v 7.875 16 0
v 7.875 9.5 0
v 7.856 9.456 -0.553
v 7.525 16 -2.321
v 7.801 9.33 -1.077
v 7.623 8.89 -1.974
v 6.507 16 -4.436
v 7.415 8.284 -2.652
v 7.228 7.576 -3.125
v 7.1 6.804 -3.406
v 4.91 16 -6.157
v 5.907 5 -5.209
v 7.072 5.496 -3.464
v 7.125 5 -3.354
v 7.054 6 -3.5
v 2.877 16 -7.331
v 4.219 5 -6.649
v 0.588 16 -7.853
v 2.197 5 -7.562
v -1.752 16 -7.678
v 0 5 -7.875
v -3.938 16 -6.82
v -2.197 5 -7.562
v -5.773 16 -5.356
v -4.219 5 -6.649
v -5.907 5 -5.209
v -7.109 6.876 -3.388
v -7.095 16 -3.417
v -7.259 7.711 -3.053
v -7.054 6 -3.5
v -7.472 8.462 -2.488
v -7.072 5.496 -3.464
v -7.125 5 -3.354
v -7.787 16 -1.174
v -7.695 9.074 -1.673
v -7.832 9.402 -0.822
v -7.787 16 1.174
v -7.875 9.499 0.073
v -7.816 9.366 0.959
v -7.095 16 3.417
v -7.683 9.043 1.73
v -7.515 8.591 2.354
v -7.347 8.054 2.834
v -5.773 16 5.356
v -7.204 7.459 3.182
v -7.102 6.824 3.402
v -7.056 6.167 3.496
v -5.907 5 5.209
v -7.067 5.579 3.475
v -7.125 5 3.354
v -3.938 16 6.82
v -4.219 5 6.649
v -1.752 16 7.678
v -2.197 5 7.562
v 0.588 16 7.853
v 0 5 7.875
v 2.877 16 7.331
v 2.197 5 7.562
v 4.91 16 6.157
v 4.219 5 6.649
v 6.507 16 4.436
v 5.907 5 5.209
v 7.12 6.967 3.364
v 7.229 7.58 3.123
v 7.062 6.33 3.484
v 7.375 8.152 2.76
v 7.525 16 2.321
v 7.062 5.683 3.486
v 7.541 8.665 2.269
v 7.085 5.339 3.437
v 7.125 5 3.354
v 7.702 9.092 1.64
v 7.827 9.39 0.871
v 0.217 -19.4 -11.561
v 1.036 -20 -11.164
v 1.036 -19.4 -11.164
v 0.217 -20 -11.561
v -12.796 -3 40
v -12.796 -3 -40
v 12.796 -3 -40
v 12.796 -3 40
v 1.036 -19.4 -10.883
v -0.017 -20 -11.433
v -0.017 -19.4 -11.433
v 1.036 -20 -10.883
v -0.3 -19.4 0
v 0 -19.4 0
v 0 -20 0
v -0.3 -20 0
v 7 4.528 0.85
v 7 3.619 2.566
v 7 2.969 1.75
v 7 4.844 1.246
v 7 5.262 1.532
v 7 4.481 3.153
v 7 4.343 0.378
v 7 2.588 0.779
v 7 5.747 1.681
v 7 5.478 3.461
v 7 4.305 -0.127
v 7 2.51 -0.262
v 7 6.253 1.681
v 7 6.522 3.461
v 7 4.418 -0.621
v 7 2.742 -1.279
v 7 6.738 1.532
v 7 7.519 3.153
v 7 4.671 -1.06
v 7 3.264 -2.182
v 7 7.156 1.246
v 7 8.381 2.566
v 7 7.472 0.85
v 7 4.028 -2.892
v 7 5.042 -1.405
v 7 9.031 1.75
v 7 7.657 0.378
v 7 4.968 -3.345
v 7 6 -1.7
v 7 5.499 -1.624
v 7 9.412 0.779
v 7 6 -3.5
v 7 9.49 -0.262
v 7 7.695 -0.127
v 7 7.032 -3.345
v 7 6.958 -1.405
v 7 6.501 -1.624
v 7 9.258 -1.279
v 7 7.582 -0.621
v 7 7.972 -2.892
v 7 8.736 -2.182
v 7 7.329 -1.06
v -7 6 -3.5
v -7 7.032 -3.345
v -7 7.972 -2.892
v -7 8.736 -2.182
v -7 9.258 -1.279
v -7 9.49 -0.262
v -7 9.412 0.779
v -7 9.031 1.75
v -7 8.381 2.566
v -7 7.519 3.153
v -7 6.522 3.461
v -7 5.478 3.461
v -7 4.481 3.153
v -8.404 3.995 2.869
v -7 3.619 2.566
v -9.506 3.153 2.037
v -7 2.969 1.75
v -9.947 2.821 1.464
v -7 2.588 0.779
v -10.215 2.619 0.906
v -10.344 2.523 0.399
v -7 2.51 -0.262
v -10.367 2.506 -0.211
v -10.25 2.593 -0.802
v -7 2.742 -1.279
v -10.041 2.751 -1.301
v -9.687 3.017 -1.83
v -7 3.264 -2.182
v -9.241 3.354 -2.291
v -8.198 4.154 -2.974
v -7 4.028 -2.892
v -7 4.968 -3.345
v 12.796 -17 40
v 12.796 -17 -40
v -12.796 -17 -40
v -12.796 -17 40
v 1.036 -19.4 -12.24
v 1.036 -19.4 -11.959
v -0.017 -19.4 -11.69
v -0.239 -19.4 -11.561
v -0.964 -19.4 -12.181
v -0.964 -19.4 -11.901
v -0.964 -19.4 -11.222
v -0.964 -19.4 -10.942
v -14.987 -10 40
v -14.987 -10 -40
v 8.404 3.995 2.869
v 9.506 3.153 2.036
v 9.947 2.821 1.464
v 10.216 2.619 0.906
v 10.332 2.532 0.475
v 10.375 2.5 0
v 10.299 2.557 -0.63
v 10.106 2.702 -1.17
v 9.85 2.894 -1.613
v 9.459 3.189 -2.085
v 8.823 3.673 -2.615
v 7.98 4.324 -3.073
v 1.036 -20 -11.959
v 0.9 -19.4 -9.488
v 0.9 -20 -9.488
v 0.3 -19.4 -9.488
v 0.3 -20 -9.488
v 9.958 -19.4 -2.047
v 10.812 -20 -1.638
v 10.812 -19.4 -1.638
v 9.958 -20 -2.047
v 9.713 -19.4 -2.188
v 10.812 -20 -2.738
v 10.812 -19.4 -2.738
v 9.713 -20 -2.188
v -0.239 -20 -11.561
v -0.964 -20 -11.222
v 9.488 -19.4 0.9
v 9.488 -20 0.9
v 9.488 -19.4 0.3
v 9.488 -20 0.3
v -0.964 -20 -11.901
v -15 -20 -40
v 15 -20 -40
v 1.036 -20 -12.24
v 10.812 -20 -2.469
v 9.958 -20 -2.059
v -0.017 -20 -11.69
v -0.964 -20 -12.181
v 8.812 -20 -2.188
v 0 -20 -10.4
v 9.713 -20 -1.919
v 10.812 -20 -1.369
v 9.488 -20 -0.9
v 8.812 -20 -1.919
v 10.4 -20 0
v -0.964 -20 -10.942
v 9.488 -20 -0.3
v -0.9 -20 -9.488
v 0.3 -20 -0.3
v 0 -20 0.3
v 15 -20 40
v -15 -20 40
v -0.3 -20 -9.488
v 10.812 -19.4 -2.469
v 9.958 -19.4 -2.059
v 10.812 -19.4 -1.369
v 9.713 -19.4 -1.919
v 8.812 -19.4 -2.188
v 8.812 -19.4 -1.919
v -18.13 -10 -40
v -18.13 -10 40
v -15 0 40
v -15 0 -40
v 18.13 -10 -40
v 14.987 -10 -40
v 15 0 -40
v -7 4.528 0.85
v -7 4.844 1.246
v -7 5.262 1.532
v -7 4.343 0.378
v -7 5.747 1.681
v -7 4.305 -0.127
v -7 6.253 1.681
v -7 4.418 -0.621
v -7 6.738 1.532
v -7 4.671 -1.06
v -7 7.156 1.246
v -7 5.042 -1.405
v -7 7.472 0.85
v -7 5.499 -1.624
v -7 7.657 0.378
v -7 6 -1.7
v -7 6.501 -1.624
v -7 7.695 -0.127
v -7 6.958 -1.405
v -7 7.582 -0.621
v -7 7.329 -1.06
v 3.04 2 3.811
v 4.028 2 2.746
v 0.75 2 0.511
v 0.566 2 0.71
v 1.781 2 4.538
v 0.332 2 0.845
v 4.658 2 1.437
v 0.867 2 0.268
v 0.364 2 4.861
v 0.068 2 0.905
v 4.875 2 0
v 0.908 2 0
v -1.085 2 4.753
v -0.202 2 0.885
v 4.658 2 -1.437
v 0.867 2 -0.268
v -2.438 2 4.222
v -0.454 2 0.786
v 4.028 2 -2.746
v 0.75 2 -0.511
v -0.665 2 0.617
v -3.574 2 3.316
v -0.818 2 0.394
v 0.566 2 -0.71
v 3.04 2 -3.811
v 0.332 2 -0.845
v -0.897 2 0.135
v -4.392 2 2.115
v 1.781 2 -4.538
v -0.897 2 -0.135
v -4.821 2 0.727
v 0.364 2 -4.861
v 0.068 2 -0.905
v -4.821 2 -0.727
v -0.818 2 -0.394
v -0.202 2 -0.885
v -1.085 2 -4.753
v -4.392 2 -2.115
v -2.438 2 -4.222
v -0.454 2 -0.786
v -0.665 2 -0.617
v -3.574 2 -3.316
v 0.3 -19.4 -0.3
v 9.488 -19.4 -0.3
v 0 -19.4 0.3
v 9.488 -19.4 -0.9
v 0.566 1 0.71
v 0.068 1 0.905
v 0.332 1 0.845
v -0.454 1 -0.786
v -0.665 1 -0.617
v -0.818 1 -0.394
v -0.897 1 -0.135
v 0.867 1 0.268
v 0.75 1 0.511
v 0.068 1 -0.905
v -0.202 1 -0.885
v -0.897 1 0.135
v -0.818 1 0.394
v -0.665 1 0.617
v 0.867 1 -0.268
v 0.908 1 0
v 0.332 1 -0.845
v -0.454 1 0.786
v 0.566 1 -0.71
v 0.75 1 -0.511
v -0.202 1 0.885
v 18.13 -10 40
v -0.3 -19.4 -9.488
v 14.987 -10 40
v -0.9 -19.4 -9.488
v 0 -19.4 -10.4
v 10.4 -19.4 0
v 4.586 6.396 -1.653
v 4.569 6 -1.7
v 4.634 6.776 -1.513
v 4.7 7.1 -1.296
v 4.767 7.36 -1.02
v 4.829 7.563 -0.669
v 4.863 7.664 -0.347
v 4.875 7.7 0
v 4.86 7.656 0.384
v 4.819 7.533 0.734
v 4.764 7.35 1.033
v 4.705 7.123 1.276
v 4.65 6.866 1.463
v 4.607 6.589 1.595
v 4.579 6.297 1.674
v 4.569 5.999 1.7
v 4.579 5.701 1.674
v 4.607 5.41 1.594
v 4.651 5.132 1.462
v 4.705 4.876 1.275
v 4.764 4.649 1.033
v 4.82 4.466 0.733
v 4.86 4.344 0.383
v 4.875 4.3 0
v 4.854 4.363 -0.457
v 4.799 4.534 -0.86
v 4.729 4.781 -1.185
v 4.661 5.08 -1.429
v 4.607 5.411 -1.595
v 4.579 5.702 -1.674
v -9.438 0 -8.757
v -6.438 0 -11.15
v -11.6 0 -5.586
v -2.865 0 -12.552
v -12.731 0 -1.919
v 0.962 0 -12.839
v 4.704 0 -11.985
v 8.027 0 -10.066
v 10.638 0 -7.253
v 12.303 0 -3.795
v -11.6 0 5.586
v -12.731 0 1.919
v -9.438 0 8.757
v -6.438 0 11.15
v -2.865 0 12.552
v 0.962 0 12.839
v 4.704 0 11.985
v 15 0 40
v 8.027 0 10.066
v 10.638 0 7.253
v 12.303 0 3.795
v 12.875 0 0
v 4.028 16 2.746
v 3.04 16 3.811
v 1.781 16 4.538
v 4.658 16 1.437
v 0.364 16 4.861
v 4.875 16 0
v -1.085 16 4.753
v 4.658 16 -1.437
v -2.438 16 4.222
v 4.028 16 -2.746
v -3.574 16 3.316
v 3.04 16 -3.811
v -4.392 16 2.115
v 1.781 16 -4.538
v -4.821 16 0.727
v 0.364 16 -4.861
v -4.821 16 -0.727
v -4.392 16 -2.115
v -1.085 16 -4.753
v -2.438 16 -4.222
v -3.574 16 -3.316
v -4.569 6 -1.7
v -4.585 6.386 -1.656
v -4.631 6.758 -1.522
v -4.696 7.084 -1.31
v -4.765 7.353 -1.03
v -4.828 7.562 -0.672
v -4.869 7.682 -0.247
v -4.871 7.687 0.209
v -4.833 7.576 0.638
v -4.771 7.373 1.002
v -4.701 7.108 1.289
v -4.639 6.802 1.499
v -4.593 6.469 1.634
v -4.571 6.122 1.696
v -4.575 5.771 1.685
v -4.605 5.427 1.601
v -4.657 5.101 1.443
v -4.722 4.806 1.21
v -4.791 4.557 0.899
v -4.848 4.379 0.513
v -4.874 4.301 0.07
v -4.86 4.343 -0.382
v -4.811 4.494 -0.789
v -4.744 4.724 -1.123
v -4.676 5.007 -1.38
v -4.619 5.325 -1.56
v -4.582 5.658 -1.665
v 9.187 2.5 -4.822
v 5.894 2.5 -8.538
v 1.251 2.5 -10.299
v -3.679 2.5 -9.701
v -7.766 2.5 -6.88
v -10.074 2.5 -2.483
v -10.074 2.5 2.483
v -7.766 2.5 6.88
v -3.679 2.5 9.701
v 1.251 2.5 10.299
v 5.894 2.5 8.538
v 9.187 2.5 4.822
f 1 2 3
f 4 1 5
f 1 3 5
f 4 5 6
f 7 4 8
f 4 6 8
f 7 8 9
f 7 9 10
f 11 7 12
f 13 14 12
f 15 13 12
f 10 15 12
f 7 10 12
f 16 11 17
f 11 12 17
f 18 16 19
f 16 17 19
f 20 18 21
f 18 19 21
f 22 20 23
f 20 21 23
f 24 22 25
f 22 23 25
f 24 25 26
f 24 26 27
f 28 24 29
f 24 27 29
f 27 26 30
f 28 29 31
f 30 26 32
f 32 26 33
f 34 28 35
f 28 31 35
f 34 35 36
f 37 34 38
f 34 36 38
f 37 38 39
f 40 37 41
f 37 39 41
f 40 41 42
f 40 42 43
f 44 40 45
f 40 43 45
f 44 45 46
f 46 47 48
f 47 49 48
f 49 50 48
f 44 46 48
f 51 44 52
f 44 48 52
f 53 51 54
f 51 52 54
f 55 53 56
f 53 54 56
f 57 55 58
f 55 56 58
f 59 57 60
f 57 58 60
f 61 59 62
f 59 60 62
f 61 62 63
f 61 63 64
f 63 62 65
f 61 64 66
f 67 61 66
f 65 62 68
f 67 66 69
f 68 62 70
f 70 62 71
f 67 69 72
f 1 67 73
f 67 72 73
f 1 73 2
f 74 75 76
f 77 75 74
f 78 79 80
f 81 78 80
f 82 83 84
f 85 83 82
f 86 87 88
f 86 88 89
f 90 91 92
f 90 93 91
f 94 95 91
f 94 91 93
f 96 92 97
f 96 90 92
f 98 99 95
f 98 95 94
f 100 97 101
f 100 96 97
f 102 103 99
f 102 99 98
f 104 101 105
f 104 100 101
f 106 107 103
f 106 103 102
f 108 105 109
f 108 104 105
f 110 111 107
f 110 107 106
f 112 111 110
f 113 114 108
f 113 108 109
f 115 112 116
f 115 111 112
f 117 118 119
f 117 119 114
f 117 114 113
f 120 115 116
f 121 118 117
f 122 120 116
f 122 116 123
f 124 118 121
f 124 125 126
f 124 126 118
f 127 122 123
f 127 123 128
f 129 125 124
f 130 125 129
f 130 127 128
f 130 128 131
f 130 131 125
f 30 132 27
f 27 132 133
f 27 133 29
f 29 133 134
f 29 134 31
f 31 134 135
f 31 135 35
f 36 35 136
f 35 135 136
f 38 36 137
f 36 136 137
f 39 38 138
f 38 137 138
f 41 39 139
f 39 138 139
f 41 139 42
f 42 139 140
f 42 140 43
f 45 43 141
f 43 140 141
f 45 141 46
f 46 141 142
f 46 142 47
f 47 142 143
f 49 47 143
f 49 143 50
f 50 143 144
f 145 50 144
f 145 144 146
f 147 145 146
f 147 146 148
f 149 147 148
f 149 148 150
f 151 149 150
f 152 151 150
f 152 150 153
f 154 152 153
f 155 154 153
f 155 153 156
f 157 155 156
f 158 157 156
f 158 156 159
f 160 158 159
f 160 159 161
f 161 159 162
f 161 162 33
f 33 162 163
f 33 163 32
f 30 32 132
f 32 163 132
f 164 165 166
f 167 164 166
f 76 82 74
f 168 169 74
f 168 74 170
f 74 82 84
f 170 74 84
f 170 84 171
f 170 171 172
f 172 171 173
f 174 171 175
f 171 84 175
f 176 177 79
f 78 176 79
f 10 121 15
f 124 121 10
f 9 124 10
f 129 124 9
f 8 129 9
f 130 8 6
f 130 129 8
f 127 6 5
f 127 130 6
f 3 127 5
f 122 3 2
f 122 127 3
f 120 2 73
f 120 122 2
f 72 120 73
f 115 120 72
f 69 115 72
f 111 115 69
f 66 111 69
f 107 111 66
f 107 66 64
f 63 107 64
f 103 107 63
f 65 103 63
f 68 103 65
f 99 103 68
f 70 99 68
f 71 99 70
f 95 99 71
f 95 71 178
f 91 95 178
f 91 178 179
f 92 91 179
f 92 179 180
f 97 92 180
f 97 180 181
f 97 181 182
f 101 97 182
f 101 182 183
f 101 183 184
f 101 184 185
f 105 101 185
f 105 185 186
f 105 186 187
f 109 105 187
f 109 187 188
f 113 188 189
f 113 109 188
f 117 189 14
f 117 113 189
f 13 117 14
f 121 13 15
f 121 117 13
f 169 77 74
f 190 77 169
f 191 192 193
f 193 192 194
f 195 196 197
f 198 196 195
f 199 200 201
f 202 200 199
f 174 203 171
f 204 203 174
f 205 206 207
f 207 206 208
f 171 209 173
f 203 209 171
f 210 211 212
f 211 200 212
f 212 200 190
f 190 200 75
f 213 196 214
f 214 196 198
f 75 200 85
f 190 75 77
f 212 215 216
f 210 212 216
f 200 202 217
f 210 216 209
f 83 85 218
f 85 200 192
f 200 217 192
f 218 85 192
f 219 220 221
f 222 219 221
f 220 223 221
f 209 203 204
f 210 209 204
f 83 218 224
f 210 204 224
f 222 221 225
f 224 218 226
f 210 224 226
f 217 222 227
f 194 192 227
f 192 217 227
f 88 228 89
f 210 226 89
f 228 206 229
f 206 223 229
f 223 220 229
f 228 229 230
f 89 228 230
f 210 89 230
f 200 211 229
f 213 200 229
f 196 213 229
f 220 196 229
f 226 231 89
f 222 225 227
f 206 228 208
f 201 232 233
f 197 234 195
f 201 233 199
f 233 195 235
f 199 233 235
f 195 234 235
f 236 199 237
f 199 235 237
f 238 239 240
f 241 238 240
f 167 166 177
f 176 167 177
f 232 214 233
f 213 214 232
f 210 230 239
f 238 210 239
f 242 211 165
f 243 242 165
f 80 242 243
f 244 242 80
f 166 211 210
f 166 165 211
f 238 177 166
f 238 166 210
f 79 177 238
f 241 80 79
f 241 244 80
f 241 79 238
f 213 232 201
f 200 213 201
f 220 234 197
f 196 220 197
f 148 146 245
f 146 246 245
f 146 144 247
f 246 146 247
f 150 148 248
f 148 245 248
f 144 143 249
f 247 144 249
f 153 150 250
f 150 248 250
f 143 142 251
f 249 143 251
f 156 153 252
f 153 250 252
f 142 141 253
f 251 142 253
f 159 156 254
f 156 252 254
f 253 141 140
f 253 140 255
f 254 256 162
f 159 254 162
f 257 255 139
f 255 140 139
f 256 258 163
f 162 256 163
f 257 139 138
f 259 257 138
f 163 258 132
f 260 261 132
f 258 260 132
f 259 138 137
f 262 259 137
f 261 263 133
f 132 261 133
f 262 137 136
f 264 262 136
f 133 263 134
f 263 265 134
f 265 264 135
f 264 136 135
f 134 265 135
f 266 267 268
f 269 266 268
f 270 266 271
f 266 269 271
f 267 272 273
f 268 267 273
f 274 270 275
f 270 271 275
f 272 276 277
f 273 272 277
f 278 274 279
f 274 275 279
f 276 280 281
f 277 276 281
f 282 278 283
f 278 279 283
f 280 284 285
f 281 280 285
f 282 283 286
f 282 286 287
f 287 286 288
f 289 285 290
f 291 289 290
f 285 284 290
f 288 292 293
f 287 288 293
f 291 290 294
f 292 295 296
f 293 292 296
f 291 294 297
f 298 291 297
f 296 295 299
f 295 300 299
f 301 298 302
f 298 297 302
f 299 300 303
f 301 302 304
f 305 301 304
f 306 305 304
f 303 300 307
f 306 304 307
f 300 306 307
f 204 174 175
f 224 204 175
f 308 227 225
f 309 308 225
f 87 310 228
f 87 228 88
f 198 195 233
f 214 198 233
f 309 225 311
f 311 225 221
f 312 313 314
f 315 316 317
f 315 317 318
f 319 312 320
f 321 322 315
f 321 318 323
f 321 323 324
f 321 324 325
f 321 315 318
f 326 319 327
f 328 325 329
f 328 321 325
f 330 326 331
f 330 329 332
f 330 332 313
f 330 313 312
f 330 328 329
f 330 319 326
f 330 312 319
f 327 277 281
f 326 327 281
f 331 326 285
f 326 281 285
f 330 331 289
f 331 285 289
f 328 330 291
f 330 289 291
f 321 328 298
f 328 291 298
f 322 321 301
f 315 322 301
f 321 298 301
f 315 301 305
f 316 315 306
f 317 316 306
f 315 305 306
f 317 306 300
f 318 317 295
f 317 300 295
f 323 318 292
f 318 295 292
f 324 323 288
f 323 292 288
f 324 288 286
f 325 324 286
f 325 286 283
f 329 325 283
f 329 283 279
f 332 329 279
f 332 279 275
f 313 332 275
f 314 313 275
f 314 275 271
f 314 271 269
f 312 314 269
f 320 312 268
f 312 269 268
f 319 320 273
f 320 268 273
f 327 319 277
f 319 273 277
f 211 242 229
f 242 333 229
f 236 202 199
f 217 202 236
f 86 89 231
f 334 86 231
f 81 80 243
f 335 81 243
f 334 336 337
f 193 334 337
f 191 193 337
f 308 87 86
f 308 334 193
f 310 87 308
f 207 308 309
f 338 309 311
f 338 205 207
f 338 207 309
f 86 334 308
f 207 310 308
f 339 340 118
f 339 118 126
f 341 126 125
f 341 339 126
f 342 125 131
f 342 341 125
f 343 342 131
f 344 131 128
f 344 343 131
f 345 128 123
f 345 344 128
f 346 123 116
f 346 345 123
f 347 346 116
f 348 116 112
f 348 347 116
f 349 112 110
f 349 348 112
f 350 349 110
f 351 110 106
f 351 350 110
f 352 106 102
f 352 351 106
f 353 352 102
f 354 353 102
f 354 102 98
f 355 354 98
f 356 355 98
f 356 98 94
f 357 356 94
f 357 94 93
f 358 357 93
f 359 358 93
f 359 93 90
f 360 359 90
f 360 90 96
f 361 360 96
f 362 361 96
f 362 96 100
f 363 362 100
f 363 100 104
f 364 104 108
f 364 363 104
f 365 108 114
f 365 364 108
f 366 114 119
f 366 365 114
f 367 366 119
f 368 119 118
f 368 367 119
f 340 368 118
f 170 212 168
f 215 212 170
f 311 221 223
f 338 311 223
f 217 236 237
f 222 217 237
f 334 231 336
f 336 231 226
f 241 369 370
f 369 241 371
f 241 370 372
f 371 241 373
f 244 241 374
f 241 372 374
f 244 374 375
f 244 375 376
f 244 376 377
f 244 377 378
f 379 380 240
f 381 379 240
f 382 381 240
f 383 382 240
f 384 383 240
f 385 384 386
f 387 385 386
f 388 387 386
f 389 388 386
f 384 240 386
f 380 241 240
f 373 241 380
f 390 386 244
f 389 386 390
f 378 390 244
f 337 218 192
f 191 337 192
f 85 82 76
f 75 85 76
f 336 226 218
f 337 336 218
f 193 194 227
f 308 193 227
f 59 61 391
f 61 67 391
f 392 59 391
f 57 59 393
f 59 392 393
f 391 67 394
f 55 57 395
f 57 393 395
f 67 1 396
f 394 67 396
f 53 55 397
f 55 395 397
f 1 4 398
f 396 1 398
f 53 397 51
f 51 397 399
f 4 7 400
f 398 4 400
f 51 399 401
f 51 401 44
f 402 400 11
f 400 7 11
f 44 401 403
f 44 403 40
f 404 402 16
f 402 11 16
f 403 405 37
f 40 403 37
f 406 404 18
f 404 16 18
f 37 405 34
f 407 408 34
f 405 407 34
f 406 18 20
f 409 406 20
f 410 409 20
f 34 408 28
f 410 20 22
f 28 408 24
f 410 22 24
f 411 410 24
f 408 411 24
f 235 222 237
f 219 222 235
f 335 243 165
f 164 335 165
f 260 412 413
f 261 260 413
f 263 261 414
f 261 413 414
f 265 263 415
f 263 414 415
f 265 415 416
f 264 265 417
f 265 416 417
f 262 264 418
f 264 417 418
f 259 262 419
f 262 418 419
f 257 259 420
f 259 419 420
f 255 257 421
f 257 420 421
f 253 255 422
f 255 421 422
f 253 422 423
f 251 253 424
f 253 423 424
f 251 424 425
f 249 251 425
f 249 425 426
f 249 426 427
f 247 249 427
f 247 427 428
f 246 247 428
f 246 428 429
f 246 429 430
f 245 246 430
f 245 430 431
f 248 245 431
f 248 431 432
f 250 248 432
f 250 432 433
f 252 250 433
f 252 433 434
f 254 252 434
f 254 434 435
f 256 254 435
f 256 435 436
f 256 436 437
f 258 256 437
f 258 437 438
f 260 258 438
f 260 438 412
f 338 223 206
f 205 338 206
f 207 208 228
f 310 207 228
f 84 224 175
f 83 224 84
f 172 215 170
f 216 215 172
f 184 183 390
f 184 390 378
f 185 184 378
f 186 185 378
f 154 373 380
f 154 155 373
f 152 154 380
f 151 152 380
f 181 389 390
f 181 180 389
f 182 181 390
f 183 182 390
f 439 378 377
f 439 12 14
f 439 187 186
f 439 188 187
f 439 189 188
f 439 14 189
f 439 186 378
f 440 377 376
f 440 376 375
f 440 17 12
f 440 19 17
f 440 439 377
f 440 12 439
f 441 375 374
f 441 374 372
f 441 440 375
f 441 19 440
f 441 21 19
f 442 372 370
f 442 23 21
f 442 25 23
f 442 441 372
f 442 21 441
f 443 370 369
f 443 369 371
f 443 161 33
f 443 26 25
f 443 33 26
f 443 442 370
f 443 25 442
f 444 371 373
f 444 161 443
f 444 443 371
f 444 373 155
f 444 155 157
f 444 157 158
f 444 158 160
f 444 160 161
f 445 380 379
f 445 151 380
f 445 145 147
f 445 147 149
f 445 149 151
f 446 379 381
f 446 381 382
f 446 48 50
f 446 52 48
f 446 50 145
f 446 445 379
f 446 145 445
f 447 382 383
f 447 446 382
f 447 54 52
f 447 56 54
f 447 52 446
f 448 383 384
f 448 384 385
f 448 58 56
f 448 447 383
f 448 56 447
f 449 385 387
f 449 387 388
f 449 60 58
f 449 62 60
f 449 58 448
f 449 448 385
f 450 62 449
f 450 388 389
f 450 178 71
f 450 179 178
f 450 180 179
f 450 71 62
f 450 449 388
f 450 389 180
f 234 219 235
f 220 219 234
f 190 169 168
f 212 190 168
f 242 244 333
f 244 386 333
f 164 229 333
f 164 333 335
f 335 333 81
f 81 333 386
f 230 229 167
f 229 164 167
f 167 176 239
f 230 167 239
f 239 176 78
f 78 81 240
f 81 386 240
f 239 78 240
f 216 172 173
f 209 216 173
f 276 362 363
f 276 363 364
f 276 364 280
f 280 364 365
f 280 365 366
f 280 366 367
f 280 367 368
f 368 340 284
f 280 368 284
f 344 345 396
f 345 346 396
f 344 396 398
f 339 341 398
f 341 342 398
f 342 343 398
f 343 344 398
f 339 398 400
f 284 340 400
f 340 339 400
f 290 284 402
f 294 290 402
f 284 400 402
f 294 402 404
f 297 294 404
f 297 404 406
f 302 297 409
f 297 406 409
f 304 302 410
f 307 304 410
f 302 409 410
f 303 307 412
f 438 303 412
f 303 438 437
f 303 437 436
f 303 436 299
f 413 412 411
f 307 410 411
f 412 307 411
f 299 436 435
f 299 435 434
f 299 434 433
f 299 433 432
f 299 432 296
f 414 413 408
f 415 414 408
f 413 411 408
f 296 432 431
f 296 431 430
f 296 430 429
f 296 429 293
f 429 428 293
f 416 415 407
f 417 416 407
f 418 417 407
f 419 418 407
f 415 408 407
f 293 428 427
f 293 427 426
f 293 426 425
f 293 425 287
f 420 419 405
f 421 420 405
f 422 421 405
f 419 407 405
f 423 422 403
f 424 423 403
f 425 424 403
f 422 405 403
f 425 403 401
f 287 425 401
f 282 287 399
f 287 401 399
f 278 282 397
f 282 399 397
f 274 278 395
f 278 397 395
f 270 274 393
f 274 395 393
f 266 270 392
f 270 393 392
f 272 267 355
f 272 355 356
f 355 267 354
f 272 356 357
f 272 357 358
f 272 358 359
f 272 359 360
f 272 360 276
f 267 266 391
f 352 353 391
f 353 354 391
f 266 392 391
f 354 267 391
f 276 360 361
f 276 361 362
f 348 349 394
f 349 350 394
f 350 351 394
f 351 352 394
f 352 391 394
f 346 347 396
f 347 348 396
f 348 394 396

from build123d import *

# Parameters (mm, degrees)
EXTRUDE_1_DEPTH          = 40
CUT_EXTRUDE_3_DEPTH      = 85.431707145
CHAMFER_1_SIZE           = 5
CUT_EXTRUDE_1_DEPTH      = 10
CUT_EXTRUDE_1_DEPTH_BACK = 10
SKETCH_5_R               = 1.7
SKETCH_6_R               = 3.5
CUT_EXTRUDE_2_DEPTH      = 10
CUT_EXTRUDE_4_DEPTH      = 0.6
CUT_EXTRUDE_5_DEPTH      = 0.6
SKETCH_10_R              = 0.90757886
CUT_EXTRUDE_6_DEPTH      = 1


with BuildPart() as part:
    # 草图1 → 凸台-拉伸1 (new, symmetric)
    with BuildSketch(Plane.XY):
        Polygon((-15, 0), (15, 0), (18.130448736, -10), (15, -20), (-15, -20), (-18.130448736, -10), align=None)
    extrude(amount=EXTRUDE_1_DEPTH, both=True)

    # 草图7 → 切除-拉伸3 (cut, through all)
    with BuildSketch(Plane(origin=(0, 0, -40), x_dir=(-1, 0, 0), z_dir=(0, 0, -1))):
        Polygon((14.986888042, -10), (12.795573927, -3), (-12.795573927, -3), (-14.986888042, -10), (-12.795573927, -17), (12.795573927, -17), align=None)
    extrude(amount=-CUT_EXTRUDE_3_DEPTH, mode=Mode.SUBTRACT)

    # 草图3 → 旋转1 (revolve)
    with BuildSketch(Plane.XY):
        Polygon((4.875, 16), (7.875, 16), (7.875, 0), (0, 0), (0, 2), (4.875, 2), align=None)
    revolve(axis=Axis((0, 0, 0), (0, 1, 0)))

    # 倒角1
    chamfer_1_edges = [part.edges().sort_by_distance(p)[0] for p in [
        (-7.875, 0, 0),
    ]]
    chamfer(chamfer_1_edges, length=CHAMFER_1_SIZE)

    # 草图5 → 切除-拉伸1 (cut, two sides: drawn at the far end of the back side and taken through both)
    with BuildSketch(Plane(origin=(0, 0, 0), x_dir=(0, 0, -1), z_dir=(1, 0, 0)).offset(-CUT_EXTRUDE_1_DEPTH_BACK)):
        with Locations((0, 6)):
            Circle(SKETCH_5_R)
    extrude(amount=CUT_EXTRUDE_1_DEPTH + CUT_EXTRUDE_1_DEPTH_BACK, mode=Mode.SUBTRACT)

    # 草图6 → 切除-拉伸2 (cut)
    with BuildSketch(Plane(origin=(7, 0, 0), x_dir=(0, 0, -1), z_dir=(1, 0, 0))):
        with Locations((0, 6)):
            Circle(SKETCH_6_R)
    cut_extrude_2 = extrude(amount=CUT_EXTRUDE_2_DEPTH, mode=Mode.SUBTRACT)

    # 镜向1: 切除-拉伸2 across plane
    add(cut_extrude_2.mirror(Plane(origin=(0, 0, 0), x_dir=(0, 0, 1), z_dir=(1, 0, 0))), mode=Mode.SUBTRACT)

    # 草图8 → 切除-拉伸4 (cut)
    with BuildSketch(Plane.XZ.offset(20)):
        Polygon((-0.3, 0), (-0.3, -9.488320233), (-0.9, -9.488320233), (0, -10.399776511), (0.9, -9.488320233), (0.3, -9.488320233), (0.3, 0), align=None)
        Polygon((0, -0.3), (9.488320233, -0.3), (9.488320233, -0.9), (10.399776511, 0), (9.488320233, 0.9), (9.488320233, 0.3), (0, 0.3), align=None)
    extrude(amount=-CUT_EXTRUDE_4_DEPTH, mode=Mode.SUBTRACT)

    # 草图9 → 切除-拉伸5 (cut)
    with BuildSketch(Plane.XZ.offset(20)):
        Polygon((1.036018744, -10.883097159), (1.036018744, -11.163798913), (0.217305293, -11.561459732), (1.036018744, -11.959120551), (1.036018744, -12.239822305), (-0.016612835, -11.690114703), (-0.963981256, -12.181342773), (-0.963981256, -11.900641018), (-0.238835058, -11.561459732), (-0.963981256, -11.222278445), (-0.963981256, -10.941576691), (-0.016612835, -11.432804761), align=None)
        Polygon((10.812249856, -2.737510211), (9.712834652, -2.187802609), (8.812249856, -2.187802609), (8.812249856, -1.918796761), (9.712834652, -1.918796761), (10.812249856, -1.369089158), (10.812249856, -1.638095006), (9.958448687, -2.047451731), (9.958448687, -2.059147638), (10.812249856, -2.468504363), align=None)
    extrude(amount=-CUT_EXTRUDE_5_DEPTH, mode=Mode.SUBTRACT)

    # 草图10 → 切除-拉伸6 (cut)
    with BuildSketch(Plane(origin=(0, 2, 0), x_dir=(1, 0, 0), z_dir=(0, 1, 0))):
        Circle(SKETCH_10_R)
    extrude(amount=-CUT_EXTRUDE_6_DEPTH, mode=Mode.SUBTRACT)


solid = part.part
